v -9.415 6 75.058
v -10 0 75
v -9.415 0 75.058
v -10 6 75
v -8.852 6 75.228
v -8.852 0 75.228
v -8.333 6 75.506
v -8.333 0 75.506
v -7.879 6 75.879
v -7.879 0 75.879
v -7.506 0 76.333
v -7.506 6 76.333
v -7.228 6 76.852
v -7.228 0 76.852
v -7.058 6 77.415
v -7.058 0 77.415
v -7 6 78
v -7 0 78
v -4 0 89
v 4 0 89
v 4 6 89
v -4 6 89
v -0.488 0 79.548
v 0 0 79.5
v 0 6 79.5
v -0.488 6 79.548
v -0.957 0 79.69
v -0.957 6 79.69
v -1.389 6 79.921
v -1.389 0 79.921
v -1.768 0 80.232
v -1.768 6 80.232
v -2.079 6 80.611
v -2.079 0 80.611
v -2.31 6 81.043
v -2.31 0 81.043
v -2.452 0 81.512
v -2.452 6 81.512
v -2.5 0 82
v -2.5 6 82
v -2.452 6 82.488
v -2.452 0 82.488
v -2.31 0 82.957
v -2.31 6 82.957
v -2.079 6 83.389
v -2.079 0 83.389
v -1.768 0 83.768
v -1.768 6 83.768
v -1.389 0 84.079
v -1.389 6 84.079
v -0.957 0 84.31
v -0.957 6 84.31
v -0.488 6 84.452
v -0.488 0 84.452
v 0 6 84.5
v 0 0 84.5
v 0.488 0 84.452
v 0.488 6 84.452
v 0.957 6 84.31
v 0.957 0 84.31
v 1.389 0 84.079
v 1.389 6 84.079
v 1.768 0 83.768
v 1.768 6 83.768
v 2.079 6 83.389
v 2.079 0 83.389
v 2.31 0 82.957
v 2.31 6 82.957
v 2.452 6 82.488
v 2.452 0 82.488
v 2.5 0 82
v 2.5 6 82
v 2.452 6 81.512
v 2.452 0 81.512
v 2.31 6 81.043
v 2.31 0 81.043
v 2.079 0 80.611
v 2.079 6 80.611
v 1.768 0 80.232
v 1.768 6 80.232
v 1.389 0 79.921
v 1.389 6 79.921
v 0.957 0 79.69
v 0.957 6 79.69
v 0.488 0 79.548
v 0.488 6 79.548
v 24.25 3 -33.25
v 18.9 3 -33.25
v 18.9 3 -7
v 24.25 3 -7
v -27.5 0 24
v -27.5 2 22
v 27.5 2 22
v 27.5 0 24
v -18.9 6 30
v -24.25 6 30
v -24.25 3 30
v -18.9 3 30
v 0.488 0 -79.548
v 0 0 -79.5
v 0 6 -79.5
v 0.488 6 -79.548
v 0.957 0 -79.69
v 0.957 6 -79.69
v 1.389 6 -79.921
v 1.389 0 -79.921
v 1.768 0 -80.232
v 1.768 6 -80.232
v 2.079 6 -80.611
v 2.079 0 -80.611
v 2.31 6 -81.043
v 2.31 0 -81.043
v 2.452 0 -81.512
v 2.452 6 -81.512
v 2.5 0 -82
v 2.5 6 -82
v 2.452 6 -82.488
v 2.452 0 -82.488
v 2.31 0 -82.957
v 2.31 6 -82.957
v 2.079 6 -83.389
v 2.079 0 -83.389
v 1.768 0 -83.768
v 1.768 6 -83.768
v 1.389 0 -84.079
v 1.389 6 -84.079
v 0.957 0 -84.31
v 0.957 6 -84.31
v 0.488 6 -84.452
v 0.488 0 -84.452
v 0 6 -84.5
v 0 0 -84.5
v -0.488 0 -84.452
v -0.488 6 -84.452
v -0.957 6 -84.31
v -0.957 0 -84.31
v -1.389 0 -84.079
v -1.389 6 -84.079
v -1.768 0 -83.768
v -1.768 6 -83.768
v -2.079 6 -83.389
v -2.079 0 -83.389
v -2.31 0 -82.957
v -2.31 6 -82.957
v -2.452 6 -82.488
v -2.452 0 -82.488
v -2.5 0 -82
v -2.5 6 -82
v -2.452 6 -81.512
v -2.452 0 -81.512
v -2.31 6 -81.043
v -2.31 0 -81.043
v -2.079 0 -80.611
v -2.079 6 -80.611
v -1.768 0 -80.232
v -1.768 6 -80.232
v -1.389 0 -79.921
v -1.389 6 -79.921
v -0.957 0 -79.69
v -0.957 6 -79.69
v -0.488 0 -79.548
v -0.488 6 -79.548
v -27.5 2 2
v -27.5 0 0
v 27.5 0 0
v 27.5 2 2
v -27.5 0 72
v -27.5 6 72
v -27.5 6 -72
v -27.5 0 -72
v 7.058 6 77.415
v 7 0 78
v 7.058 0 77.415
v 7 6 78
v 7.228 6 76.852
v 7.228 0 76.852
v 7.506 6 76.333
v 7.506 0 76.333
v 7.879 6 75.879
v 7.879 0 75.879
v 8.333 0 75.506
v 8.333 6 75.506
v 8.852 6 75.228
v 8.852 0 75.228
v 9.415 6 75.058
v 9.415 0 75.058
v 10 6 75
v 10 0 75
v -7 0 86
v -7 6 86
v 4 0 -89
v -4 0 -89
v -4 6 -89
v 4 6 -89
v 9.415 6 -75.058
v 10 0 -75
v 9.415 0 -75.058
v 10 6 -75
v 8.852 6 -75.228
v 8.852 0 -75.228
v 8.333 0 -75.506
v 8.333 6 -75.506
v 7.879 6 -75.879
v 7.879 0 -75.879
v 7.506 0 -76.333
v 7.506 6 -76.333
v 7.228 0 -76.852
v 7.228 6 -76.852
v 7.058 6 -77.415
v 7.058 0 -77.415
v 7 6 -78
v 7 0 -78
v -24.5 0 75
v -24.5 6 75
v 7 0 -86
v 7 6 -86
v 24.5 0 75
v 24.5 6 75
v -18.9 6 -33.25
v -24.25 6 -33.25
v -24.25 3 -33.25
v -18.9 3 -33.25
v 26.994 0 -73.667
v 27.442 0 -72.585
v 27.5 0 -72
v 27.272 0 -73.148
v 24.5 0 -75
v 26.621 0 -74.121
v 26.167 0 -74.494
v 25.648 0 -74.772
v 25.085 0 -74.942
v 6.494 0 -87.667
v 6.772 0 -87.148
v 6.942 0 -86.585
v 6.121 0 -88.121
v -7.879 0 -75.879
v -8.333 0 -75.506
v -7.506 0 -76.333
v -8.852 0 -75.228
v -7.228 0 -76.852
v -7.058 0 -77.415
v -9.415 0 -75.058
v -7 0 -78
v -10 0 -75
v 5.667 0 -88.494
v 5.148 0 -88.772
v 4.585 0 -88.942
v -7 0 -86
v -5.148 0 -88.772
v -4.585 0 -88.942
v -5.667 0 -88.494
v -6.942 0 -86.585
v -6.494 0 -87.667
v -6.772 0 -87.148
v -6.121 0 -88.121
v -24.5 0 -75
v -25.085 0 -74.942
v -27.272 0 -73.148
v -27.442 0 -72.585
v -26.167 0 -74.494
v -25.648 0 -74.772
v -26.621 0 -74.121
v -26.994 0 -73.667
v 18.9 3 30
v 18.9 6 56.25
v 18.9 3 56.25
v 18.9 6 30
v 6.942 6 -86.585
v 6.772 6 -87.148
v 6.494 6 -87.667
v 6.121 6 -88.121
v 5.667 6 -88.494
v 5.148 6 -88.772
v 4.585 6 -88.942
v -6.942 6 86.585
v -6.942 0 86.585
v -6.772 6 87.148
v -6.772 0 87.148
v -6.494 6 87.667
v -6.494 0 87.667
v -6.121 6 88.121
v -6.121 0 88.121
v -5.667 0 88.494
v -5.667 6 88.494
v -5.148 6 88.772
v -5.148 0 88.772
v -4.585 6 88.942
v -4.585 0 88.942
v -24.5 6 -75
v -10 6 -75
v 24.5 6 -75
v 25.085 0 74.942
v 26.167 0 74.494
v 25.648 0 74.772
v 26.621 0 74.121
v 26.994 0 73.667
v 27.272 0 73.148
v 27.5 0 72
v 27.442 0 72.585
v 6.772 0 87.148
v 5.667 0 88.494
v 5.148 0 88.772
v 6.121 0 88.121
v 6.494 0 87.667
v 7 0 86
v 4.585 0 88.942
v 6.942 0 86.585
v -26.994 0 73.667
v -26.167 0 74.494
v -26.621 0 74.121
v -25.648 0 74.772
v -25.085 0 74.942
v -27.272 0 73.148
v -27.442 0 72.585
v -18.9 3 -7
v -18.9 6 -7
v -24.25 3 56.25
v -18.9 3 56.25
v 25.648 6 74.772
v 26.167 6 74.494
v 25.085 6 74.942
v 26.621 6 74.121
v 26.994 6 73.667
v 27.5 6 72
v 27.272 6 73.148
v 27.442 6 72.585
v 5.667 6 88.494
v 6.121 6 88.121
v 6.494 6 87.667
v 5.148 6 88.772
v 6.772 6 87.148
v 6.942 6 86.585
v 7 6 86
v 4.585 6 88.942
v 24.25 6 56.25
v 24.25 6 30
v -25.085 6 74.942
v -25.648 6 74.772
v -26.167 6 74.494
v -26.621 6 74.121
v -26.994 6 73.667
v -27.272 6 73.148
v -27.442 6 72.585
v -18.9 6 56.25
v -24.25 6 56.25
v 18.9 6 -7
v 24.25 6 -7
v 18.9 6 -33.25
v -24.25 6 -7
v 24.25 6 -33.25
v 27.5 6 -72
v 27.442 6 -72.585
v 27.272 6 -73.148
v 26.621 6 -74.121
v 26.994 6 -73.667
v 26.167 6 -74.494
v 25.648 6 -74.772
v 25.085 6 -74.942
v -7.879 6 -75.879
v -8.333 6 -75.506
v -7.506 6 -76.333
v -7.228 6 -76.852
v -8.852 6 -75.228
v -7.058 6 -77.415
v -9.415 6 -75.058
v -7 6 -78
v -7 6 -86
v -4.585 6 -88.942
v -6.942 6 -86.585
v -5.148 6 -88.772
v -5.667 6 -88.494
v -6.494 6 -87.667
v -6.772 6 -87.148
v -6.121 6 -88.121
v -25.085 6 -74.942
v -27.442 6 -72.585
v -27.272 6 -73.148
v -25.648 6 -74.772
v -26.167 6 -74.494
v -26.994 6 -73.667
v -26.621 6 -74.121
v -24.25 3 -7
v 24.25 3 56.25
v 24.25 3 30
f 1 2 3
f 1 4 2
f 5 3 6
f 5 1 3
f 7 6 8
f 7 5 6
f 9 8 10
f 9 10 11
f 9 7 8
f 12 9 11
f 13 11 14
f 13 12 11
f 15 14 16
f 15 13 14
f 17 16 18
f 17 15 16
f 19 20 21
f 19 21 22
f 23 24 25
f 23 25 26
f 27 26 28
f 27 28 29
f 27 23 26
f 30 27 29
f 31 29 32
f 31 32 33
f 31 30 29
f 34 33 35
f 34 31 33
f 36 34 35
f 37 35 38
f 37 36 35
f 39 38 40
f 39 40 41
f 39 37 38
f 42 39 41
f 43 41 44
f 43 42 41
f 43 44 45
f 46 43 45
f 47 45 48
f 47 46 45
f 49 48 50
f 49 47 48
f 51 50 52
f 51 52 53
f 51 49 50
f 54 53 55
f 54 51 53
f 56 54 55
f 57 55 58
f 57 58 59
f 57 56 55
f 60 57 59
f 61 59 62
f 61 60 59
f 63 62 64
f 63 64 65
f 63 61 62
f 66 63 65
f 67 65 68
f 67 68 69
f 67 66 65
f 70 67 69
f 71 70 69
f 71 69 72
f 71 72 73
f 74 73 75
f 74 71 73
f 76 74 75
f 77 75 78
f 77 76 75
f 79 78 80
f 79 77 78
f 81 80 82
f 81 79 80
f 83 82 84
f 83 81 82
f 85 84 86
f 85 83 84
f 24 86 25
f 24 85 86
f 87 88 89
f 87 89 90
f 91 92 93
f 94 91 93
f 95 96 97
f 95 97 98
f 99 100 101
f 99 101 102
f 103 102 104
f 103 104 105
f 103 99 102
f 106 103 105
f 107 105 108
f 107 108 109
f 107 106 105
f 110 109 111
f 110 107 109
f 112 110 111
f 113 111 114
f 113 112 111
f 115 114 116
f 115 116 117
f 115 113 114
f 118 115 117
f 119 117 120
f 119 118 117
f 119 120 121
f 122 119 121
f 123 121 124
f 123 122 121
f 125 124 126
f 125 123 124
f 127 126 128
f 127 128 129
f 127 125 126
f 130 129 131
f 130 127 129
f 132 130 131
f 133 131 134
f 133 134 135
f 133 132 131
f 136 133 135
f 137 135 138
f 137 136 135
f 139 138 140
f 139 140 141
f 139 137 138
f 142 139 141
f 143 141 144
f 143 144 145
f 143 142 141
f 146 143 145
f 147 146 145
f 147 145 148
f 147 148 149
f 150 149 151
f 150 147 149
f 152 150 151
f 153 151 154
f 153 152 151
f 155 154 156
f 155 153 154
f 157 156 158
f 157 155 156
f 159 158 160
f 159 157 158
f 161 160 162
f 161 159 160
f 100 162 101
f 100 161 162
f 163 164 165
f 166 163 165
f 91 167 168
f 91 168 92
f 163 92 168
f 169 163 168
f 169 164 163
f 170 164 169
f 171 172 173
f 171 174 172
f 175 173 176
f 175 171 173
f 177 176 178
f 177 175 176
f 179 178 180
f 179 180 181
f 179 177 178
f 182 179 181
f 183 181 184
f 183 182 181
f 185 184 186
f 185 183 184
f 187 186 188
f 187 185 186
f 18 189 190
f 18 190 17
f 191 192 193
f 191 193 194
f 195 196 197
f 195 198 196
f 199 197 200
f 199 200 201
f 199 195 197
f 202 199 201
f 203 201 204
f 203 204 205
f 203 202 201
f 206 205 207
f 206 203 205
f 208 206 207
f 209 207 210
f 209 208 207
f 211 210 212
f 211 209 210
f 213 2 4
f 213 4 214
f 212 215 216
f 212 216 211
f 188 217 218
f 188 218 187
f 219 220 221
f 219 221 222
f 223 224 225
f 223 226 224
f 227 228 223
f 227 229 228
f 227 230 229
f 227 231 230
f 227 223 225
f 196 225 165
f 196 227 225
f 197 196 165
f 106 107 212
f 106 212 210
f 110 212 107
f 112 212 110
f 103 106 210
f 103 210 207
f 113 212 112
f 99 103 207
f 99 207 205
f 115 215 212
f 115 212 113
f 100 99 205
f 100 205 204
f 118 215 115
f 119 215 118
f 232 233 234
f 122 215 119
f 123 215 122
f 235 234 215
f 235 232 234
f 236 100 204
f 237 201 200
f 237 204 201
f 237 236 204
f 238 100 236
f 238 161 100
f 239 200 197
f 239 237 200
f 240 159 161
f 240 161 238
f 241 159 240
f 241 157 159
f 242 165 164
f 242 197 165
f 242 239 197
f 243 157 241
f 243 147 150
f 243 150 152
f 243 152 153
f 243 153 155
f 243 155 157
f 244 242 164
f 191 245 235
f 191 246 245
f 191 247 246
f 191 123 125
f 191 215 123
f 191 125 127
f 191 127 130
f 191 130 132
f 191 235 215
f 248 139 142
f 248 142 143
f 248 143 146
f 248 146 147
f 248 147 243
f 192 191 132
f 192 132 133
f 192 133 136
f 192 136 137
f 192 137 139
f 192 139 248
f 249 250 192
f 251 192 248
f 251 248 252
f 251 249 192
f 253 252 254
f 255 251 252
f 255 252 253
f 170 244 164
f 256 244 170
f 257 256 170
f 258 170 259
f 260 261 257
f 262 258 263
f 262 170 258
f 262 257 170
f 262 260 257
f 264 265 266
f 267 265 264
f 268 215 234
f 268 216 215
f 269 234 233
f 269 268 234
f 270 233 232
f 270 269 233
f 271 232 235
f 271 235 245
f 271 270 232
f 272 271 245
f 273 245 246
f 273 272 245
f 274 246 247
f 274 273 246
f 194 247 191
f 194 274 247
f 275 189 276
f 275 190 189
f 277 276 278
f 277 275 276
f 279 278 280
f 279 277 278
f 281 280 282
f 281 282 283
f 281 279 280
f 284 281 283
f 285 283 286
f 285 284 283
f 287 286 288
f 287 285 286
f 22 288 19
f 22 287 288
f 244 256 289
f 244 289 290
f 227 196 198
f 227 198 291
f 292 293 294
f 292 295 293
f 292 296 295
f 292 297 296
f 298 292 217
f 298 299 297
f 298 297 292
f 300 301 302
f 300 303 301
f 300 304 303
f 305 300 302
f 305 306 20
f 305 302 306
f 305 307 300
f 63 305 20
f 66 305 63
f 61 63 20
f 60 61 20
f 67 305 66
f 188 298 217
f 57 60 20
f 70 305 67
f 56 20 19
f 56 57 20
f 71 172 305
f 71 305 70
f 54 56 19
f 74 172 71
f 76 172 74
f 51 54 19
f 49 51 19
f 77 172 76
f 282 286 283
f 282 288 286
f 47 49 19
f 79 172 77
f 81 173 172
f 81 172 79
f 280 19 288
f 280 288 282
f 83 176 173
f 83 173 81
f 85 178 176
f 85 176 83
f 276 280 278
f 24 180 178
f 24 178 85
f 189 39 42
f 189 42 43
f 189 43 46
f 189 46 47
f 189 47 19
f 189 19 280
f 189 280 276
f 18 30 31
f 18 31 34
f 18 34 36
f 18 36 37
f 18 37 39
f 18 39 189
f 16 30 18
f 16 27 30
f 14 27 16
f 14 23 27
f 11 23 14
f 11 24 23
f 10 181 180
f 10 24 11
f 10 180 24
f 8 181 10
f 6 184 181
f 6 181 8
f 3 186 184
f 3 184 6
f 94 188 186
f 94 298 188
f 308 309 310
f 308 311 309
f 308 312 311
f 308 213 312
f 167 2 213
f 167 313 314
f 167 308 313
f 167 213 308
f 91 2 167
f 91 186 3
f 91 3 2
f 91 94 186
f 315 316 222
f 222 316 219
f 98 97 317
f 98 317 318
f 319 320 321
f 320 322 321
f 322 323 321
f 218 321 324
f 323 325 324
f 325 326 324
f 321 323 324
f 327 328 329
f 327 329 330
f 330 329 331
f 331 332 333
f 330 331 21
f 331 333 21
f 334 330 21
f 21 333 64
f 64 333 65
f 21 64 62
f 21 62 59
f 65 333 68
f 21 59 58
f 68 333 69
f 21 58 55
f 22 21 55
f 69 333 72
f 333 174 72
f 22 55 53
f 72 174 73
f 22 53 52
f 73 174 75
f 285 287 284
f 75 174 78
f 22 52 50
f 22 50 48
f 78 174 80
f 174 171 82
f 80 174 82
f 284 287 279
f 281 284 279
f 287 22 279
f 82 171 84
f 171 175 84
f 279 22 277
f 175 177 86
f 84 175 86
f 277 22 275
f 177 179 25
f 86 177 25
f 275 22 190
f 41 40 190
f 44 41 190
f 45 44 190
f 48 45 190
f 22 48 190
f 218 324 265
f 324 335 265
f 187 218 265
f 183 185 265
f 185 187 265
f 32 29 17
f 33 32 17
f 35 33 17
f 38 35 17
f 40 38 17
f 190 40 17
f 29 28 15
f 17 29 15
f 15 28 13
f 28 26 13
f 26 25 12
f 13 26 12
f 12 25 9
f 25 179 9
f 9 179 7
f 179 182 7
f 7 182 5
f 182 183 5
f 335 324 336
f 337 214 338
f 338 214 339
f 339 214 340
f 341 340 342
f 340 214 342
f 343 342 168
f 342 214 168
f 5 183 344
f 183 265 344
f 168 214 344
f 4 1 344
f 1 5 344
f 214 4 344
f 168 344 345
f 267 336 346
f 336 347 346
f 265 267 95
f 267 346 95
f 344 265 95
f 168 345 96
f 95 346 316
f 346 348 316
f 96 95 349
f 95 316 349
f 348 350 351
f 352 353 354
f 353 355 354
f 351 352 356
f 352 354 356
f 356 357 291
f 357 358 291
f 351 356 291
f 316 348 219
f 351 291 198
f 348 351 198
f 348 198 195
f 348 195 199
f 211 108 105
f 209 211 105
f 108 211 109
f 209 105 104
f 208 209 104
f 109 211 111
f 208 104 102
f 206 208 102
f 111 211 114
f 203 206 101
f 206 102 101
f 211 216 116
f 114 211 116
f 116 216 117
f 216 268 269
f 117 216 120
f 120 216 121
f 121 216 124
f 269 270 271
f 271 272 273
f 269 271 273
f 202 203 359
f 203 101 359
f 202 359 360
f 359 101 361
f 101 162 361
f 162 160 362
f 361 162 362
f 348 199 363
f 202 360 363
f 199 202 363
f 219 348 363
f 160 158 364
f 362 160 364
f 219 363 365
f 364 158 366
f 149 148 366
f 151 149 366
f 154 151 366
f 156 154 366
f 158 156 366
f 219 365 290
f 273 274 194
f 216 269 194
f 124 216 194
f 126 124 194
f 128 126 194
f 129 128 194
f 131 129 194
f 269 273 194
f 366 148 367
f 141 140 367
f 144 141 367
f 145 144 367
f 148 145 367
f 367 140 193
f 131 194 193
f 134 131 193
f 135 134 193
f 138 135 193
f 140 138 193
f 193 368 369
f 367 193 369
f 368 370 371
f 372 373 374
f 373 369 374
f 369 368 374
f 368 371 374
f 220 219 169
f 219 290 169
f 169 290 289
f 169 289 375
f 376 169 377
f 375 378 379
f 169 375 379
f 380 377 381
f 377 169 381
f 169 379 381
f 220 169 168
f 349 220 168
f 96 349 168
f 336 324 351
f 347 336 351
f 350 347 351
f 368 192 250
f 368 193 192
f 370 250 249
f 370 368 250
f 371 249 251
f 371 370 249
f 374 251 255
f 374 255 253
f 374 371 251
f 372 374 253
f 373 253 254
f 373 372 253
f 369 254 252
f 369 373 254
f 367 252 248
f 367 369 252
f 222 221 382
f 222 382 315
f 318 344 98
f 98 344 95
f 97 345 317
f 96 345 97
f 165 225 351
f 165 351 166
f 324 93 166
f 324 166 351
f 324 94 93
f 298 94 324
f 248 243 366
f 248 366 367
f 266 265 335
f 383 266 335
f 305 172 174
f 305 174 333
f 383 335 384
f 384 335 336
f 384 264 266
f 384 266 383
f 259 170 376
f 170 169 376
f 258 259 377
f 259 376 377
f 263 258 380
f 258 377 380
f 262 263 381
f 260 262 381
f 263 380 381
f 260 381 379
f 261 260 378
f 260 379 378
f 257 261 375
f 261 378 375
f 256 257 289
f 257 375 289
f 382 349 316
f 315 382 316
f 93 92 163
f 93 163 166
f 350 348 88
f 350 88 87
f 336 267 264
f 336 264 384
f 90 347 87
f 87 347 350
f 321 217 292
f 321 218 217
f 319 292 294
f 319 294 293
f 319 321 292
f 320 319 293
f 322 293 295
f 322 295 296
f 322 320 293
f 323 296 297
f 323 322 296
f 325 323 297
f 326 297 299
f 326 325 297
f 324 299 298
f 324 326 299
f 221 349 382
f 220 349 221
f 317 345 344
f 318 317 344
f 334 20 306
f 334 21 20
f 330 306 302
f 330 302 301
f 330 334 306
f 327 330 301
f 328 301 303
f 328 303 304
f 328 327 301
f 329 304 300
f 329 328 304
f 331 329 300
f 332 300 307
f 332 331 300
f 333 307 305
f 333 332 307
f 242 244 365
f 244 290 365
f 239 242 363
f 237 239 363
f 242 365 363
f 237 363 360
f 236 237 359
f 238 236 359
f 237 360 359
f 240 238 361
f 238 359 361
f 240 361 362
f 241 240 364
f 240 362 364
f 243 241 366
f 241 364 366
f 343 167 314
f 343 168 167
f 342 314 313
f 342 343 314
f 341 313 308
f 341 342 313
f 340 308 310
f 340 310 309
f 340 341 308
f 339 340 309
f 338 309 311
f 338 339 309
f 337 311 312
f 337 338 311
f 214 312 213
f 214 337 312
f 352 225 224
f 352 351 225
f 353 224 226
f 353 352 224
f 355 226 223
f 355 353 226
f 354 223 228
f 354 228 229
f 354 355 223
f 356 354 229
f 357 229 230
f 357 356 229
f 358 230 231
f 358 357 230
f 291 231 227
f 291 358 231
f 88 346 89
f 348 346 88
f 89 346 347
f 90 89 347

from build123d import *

# Parameters (mm, degrees)
SKIZZE1_R                       = 2.5
AUFSATZ_LINEAR_AUSTRAGEN1_DEPTH = 6
SKIZZE2_W                       = 5.35
SKIZZE2_H                       = 26.25
SCHNITT_LINEAR_AUSTRAGEN1_DEPTH = 3
SKIZZE3_W                       = 55
SKIZZE3_H                       = 20
SCHNITT_LINEAR_AUSTRAGEN2_DEPTH = 2
VERRUNDUNG1_R                   = 3
FASE1_SIZE                      = 2


with BuildPart() as part:
    # Skizze1 → Aufsatz-Linear austragen1 (new body)
    with BuildSketch(Plane(origin=(0, 0, 0), x_dir=(1, 0, 0), z_dir=(0, 1, 0))):
        Polygon((-27.5, -75), (-27.5, 75), (-7, 75), (-7, 89), (7, 89), (7, 75), (27.5, 75), (27.5, -75), (7, -75), (7, -89), (-7, -89), (-7, -75), align=None)
        with Locations(Location((0, 82, 0), (0, 0, 270))):
            Circle(SKIZZE1_R, mode=Mode.SUBTRACT)
        with Locations(Location((0, -82, 0), (0, 0, 90))):
            Circle(SKIZZE1_R, mode=Mode.SUBTRACT)
    extrude(amount=AUFSATZ_LINEAR_AUSTRAGEN1_DEPTH)

    # Skizze2 → Schnitt-Linear austragen1 (cut)
    with BuildSketch(Plane(origin=(0, 6, 0), x_dir=(1, 0, 0), z_dir=(0, 1, 0))):
        with Locations((-21.575, 20.125)):
            Rectangle(SKIZZE2_W, SKIZZE2_H)
        with Locations((21.575, 20.125)):
            Rectangle(SKIZZE2_W, SKIZZE2_H)
        with Locations((-21.575, -43.125)):
            Rectangle(SKIZZE2_W, SKIZZE2_H)
        with Locations((21.575, -43.125)):
            Rectangle(SKIZZE2_W, SKIZZE2_H)
    extrude(amount=-SCHNITT_LINEAR_AUSTRAGEN1_DEPTH, mode=Mode.SUBTRACT)

    # Skizze3 → Schnitt-Linear austragen2 (cut)
    with BuildSketch(Plane.XZ):
        with Locations((0, 12)):
            Rectangle(SKIZZE3_W, SKIZZE3_H)
    extrude(amount=-SCHNITT_LINEAR_AUSTRAGEN2_DEPTH, mode=Mode.SUBTRACT)

    # Verrundung1
    verrundung1_edges = [part.edges().sort_by_distance(p)[0] for p in [
        (-7, 3, -75),
        (-7, 3, -89),
        (7, 3, -89),
        (7, 3, -75),
        (27.5, 3, -75),
        (27.5, 3, 75),
        (7, 3, 75),
        (7, 3, 89),
        (-7, 3, 89),
        (-7, 3, 75),
        (-27.5, 3, 75),
        (-27.5, 3, -75),
    ]]
    fillet(verrundung1_edges, radius=VERRUNDUNG1_R)

    # Fase1
    fase1_edges = [part.edges().sort_by_distance(p)[0] for p in [
        (0, 0, 22),
        (0, 0, 2),
    ]]
    chamfer(fase1_edges, length=FASE1_SIZE - 0.0001)  # a hair under: the kernel refuses the full size


solid = part.part
